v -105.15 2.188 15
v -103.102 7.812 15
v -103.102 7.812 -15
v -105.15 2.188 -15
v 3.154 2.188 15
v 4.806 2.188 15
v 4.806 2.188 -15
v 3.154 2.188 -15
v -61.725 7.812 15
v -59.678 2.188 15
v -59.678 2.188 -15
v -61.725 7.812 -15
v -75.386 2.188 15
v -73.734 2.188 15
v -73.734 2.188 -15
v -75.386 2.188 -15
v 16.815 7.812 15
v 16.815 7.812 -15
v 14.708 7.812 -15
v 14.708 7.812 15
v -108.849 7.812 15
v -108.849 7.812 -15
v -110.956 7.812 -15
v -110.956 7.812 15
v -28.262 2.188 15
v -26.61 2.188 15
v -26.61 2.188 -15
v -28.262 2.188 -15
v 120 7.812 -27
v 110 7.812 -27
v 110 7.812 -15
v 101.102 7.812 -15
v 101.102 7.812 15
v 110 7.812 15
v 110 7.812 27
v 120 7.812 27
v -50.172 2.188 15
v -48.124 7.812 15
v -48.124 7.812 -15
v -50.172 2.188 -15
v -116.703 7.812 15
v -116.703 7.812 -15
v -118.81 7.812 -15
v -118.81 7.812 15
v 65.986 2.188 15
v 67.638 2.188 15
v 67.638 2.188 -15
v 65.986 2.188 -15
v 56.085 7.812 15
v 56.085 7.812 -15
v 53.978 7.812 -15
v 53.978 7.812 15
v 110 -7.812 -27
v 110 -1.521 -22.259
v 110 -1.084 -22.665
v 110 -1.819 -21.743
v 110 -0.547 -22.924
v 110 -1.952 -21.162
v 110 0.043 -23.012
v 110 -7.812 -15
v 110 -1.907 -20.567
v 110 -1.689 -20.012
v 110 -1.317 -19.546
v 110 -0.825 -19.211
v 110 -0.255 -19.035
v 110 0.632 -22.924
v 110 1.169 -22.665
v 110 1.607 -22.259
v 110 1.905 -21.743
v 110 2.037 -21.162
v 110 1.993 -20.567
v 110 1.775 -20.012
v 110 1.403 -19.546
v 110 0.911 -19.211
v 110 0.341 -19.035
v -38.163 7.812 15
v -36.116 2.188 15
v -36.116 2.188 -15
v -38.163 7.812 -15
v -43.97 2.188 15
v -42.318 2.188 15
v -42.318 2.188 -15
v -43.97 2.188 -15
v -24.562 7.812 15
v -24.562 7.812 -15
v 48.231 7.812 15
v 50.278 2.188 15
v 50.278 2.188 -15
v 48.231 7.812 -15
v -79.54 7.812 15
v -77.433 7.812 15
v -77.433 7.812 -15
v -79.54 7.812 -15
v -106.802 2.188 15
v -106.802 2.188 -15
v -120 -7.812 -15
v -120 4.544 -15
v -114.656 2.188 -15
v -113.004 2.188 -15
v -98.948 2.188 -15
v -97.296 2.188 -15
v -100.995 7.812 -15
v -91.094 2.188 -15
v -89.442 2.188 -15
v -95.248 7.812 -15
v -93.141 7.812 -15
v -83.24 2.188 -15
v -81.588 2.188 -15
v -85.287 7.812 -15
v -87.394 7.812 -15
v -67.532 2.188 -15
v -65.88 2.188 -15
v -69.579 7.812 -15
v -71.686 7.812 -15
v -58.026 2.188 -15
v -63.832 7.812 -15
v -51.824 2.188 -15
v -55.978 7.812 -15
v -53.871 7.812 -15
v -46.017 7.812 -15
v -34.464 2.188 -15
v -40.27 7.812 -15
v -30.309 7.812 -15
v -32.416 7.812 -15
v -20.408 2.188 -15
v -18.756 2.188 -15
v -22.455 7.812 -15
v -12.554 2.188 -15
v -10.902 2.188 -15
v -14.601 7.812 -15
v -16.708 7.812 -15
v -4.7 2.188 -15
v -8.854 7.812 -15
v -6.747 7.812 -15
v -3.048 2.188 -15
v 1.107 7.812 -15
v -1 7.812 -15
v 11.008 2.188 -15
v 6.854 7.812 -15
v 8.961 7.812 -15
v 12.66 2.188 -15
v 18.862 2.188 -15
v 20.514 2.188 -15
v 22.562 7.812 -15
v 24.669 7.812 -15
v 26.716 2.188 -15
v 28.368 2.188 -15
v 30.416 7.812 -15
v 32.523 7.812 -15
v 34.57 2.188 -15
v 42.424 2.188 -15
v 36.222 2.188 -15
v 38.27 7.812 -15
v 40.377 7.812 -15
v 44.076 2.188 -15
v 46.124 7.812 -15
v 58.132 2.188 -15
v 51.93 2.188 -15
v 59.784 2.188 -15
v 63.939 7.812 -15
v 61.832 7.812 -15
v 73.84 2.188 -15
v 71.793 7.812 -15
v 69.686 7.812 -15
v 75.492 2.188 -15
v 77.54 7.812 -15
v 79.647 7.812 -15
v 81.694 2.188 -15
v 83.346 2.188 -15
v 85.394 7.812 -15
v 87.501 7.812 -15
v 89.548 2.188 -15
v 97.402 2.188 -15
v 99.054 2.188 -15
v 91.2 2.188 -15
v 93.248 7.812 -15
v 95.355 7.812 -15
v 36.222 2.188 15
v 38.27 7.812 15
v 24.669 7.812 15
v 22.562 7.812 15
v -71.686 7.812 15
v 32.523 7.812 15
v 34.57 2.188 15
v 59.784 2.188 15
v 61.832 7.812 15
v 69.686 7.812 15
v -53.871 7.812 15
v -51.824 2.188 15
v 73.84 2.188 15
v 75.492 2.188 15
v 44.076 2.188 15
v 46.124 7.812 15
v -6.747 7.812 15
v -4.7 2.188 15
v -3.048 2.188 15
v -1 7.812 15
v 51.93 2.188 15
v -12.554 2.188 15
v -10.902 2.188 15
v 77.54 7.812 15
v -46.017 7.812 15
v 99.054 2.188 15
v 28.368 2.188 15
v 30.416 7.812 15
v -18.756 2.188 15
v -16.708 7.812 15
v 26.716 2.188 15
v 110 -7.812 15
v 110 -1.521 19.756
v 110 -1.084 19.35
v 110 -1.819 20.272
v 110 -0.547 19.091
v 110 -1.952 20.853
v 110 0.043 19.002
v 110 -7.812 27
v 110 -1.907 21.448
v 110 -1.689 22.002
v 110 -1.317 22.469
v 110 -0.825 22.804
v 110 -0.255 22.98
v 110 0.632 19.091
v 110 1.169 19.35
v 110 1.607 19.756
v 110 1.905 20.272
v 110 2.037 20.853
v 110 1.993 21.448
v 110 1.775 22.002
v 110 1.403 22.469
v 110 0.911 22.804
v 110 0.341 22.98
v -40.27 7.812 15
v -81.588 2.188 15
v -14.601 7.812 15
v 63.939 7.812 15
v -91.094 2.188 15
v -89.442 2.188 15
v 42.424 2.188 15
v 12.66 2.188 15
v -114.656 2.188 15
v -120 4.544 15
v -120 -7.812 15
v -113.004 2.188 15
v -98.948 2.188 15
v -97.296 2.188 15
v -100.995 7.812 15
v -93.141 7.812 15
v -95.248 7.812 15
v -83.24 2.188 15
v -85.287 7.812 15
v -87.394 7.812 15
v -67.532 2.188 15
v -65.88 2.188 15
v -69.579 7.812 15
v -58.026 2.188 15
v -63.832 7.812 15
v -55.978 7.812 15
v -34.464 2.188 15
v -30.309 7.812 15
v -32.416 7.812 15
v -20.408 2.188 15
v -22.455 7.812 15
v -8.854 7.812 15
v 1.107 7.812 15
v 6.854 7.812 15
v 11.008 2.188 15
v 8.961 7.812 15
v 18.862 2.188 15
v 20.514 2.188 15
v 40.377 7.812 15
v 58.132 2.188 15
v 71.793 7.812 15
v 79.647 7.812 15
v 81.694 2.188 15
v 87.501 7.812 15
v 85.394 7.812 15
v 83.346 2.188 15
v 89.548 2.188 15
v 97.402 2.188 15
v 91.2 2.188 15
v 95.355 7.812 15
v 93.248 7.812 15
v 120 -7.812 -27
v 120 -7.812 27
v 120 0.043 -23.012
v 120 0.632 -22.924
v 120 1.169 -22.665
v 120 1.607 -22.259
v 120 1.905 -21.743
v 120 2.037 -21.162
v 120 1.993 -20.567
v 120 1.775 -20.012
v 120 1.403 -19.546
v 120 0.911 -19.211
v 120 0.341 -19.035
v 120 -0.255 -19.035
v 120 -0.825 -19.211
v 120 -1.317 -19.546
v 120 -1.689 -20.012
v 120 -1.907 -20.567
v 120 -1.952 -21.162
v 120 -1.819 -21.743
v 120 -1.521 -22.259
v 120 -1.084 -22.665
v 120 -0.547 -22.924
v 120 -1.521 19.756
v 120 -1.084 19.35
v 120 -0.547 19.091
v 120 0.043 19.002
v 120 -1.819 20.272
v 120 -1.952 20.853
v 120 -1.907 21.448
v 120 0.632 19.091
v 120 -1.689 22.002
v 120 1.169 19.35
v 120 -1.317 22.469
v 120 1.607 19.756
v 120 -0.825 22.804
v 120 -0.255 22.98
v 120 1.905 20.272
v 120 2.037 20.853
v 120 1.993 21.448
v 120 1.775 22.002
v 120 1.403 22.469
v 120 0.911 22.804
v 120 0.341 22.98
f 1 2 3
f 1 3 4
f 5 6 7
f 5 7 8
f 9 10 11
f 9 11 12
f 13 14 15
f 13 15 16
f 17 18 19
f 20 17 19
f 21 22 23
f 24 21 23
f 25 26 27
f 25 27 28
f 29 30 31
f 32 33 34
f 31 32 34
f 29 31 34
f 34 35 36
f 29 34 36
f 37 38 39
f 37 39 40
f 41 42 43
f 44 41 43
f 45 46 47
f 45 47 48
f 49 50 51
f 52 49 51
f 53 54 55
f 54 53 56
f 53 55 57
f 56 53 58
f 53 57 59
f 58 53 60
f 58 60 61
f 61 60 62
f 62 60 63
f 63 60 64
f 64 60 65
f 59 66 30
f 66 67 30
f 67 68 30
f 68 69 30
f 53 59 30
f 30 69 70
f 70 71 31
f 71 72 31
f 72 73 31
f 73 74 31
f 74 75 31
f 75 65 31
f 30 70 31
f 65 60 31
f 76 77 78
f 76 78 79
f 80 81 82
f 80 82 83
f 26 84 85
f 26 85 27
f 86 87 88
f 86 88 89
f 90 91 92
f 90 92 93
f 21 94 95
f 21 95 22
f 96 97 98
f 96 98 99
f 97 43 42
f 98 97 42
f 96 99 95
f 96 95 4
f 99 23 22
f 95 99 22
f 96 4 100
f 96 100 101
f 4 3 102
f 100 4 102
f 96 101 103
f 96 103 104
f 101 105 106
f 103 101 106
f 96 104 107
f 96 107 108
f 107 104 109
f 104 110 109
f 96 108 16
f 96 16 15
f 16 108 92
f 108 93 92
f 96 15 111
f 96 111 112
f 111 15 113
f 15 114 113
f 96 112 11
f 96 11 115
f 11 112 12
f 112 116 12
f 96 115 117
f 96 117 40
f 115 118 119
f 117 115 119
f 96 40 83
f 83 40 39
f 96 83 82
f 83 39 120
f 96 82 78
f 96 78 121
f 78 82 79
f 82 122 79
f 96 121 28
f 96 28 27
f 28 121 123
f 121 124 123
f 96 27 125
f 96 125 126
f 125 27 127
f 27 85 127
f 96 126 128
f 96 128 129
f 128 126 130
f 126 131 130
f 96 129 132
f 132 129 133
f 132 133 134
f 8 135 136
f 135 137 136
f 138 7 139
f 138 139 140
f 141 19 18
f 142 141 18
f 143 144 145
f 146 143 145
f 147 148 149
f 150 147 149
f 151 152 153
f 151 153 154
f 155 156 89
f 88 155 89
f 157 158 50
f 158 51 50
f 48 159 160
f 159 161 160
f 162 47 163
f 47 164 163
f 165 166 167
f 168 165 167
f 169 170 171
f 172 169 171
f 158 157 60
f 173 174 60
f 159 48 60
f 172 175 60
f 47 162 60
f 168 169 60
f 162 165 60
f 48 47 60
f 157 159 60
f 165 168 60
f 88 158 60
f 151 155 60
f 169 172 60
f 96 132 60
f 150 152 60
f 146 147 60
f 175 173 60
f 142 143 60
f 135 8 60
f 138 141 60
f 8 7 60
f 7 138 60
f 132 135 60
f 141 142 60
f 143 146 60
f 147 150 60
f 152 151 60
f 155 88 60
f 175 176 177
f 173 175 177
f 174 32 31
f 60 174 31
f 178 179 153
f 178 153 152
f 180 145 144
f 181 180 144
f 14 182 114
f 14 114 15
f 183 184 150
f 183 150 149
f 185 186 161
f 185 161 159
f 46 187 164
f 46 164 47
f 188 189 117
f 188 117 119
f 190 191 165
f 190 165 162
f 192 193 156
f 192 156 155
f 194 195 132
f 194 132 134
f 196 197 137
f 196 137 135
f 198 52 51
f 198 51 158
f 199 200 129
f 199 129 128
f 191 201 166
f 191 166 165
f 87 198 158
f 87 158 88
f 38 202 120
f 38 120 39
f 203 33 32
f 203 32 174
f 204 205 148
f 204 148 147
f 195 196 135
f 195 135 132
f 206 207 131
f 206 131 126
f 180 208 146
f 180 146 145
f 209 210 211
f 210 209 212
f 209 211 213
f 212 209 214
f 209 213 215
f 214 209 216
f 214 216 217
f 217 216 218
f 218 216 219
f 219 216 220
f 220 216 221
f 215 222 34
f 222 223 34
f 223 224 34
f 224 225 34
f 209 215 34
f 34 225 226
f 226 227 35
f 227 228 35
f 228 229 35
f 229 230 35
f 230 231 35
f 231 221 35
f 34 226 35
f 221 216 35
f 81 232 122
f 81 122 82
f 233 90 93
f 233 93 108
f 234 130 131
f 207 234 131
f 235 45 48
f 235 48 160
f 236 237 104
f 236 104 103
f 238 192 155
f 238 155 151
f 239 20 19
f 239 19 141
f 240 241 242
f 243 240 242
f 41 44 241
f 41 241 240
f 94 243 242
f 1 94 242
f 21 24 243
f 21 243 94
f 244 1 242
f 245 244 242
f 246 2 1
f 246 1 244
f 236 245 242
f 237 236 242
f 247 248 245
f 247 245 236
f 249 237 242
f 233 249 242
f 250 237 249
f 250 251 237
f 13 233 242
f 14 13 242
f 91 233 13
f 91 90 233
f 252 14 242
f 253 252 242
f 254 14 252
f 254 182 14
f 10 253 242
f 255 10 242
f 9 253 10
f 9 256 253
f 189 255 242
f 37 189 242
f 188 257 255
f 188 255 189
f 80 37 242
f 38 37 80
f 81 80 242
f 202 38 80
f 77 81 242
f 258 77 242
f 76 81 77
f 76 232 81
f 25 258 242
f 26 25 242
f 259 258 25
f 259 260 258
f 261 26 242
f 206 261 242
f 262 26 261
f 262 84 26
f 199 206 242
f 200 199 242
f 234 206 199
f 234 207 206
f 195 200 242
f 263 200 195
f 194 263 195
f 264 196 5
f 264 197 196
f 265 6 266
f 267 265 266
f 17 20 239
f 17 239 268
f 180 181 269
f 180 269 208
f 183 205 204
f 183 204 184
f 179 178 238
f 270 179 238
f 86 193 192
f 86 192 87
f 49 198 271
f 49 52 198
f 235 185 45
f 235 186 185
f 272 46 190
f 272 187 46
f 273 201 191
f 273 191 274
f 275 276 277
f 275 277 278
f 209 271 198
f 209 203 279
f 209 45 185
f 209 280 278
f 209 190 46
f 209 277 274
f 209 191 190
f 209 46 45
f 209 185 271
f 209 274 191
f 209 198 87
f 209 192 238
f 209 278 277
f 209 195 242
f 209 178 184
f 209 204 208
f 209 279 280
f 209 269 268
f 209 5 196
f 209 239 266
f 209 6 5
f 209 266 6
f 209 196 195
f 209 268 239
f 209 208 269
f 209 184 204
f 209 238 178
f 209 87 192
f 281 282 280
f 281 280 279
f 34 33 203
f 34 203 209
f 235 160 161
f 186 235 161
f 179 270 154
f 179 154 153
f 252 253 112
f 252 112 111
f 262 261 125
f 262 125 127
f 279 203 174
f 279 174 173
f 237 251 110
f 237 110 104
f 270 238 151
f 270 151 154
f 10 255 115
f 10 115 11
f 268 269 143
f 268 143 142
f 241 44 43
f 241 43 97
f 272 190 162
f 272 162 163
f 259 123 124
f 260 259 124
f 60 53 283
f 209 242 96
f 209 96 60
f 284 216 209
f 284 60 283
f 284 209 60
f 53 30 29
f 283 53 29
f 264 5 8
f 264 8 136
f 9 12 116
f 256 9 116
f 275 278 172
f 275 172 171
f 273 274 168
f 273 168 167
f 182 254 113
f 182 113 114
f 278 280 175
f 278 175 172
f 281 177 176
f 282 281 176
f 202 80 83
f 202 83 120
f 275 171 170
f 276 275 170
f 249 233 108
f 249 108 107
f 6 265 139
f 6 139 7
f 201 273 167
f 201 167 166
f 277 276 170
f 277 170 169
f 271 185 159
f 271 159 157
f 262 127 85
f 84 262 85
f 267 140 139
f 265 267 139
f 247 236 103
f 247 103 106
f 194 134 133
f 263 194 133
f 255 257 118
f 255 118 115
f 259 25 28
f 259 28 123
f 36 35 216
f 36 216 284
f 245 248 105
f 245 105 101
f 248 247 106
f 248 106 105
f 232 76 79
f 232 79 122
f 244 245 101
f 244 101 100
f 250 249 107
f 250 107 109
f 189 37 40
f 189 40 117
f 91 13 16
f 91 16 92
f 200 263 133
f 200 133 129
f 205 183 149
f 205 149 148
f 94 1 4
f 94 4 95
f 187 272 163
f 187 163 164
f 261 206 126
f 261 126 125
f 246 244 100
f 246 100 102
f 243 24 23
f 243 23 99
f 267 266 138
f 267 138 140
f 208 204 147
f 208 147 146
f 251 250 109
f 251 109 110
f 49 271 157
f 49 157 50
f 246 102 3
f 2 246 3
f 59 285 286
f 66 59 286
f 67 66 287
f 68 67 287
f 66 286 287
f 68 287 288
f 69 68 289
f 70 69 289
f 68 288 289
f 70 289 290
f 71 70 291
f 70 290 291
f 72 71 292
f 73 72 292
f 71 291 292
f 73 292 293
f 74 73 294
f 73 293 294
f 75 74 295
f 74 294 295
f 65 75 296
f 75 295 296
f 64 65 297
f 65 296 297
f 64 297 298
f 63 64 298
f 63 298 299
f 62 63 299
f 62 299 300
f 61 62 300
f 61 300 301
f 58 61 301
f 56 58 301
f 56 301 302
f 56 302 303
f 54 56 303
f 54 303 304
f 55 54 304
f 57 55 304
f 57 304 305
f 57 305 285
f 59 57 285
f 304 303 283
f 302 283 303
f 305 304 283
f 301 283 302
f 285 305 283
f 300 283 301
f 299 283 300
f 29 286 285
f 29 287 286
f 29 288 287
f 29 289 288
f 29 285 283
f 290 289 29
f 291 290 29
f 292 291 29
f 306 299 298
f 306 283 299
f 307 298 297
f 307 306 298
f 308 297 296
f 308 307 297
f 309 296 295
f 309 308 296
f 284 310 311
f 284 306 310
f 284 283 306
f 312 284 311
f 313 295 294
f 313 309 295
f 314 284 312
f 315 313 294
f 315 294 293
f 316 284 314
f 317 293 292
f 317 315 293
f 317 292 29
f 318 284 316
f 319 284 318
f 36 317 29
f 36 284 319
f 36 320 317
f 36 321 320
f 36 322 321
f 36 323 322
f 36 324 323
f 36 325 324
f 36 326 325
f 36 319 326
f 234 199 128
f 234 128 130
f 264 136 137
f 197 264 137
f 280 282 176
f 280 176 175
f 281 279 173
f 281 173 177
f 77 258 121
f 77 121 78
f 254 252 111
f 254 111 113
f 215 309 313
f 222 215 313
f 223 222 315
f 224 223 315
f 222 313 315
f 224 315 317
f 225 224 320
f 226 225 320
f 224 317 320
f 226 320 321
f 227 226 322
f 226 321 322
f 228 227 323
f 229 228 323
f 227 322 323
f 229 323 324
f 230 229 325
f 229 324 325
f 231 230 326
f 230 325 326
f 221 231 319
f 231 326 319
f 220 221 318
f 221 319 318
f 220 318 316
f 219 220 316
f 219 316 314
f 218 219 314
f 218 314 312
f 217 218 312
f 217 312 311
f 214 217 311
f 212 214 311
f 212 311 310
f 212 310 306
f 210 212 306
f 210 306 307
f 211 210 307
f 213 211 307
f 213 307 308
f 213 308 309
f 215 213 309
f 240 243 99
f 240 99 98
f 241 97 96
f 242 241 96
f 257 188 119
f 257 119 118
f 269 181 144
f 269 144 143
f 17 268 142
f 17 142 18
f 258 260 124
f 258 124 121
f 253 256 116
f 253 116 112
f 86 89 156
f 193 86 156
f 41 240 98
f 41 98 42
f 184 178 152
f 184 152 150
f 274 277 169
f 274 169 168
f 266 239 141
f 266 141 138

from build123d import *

# Parameters (mm, degrees)
BOSS_EXTRUDE1_DEPTH = 15
SKETCH1_3_W         = 10
SKETCH1_3_H         = 15.625
BOSS_EXTRUDE2_DEPTH = 27
SKETCH2_R           = 2
CUT_EXTRUDE1_DEPTH  = 54


with BuildPart() as part:
    # Sketch1 → Boss-Extrude1 (new body, symmetric)
    with BuildSketch(Plane.XY):
        Polygon((110, -7.8125), (110, 7.8125), (101.101563673, 7.8125), (99.054231105, 2.1875), (97.402035886, 2.1875), (95.354703318, 7.8125), (93.247563673, 7.8125), (91.200231105, 2.1875), (89.548035886, 2.1875), (87.500703318, 7.8125), (85.393563673, 7.8125), (83.346231105, 2.1875), (81.694035886, 2.1875), (79.646703318, 7.8125), (77.539563673, 7.8125), (75.492231105, 2.1875), (73.840035886, 2.1875), (71.792703318, 7.8125), (69.685563673, 7.8125), (67.638231105, 2.1875), (65.986035886, 2.1875), (63.938703318, 7.8125), (61.831563673, 7.8125), (59.784231105, 2.1875), (58.132035886, 2.1875), (56.084703318, 7.8125), (53.977563673, 7.8125), (51.930231105, 2.1875), (50.278035886, 2.1875), (48.230703318, 7.8125), (46.123563673, 7.8125), (44.076231105, 2.1875), (42.424035886, 2.1875), (40.376703318, 7.8125), (38.269563673, 7.8125), (36.222231105, 2.1875), (34.570035886, 2.1875), (32.522703318, 7.8125), (30.415563673, 7.8125), (28.368231105, 2.1875), (26.716035886, 2.1875), (24.668703318, 7.8125), (22.561563673, 7.8125), (20.514231105, 2.1875), (18.862035886, 2.1875), (16.814703318, 7.8125), (14.707563673, 7.8125), (12.660231105, 2.1875), (11.008035886, 2.1875), (8.960703318, 7.8125), (6.853563673, 7.8125), (4.806231105, 2.1875), (3.154035886, 2.1875), (1.106703318, 7.8125), (-1.000436327, 7.8125), (-3.047768895, 2.1875), (-4.699964114, 2.1875), (-6.747296682, 7.8125), (-8.854436327, 7.8125), (-10.901768895, 2.1875), (-12.553964114, 2.1875), (-14.601296682, 7.8125), (-16.708436327, 7.8125), (-18.755768895, 2.1875), (-20.407964114, 2.1875), (-22.455296682, 7.8125), (-24.562436327, 7.8125), (-26.609768895, 2.1875), (-28.261964114, 2.1875), (-30.309296682, 7.8125), (-32.416436327, 7.8125), (-34.463768895, 2.1875), (-36.115964114, 2.1875), (-38.163296682, 7.8125), (-40.270436327, 7.8125), (-42.317768895, 2.1875), (-43.969964114, 2.1875), (-46.017296682, 7.8125), (-48.124436327, 7.8125), (-50.171768895, 2.1875), (-51.823964114, 2.1875), (-53.871296682, 7.8125), (-55.978436327, 7.8125), (-58.025768895, 2.1875), (-59.677964114, 2.1875), (-61.725296682, 7.8125), (-63.832436327, 7.8125), (-65.879768895, 2.1875), (-67.531964114, 2.1875), (-69.579296682, 7.8125), (-71.686436327, 7.8125), (-73.733768895, 2.1875), (-75.385964114, 2.1875), (-77.433296682, 7.8125), (-79.540436327, 7.8125), (-81.587768895, 2.1875), (-83.239964114, 2.1875), (-85.287296682, 7.8125), (-87.394436327, 7.8125), (-89.441768895, 2.1875), (-91.093964114, 2.1875), (-93.141296682, 7.8125), (-95.248436327, 7.8125), (-97.295768895, 2.1875), (-98.947964114, 2.1875), (-100.995296682, 7.8125), (-103.102436327, 7.8125), (-105.149768895, 2.1875), (-106.801964114, 2.1875), (-108.849296682, 7.8125), (-110.956436327, 7.8125), (-113.003768895, 2.1875), (-114.655964114, 2.1875), (-116.703296682, 7.8125), (-118.810436327, 7.8125), (-120, 4.54420067), (-120, -7.8125), align=None)
    extrude(amount=BOSS_EXTRUDE1_DEPTH, both=True)

    # Sketch1<3> → Boss-Extrude2 (add, symmetric)
    with BuildSketch(Plane.XY):
        with Locations((115, 0)):
            Rectangle(SKETCH1_3_W, SKETCH1_3_H)
    extrude(amount=BOSS_EXTRUDE2_DEPTH, both=True)

    # Sketch2 → Cut-Extrude1 (cut)
    with BuildSketch(Plane(origin=(120, 0, 0), x_dir=(0, 0, -1), z_dir=(1, 0, 0))):
        with Locations((-21.002491739, 0.042849803)):
            Circle(SKETCH2_R)
        with Locations((21.012499646, 0.042849803)):
            Circle(SKETCH2_R)
    extrude(amount=-CUT_EXTRUDE1_DEPTH, mode=Mode.SUBTRACT)


solid = part.part
